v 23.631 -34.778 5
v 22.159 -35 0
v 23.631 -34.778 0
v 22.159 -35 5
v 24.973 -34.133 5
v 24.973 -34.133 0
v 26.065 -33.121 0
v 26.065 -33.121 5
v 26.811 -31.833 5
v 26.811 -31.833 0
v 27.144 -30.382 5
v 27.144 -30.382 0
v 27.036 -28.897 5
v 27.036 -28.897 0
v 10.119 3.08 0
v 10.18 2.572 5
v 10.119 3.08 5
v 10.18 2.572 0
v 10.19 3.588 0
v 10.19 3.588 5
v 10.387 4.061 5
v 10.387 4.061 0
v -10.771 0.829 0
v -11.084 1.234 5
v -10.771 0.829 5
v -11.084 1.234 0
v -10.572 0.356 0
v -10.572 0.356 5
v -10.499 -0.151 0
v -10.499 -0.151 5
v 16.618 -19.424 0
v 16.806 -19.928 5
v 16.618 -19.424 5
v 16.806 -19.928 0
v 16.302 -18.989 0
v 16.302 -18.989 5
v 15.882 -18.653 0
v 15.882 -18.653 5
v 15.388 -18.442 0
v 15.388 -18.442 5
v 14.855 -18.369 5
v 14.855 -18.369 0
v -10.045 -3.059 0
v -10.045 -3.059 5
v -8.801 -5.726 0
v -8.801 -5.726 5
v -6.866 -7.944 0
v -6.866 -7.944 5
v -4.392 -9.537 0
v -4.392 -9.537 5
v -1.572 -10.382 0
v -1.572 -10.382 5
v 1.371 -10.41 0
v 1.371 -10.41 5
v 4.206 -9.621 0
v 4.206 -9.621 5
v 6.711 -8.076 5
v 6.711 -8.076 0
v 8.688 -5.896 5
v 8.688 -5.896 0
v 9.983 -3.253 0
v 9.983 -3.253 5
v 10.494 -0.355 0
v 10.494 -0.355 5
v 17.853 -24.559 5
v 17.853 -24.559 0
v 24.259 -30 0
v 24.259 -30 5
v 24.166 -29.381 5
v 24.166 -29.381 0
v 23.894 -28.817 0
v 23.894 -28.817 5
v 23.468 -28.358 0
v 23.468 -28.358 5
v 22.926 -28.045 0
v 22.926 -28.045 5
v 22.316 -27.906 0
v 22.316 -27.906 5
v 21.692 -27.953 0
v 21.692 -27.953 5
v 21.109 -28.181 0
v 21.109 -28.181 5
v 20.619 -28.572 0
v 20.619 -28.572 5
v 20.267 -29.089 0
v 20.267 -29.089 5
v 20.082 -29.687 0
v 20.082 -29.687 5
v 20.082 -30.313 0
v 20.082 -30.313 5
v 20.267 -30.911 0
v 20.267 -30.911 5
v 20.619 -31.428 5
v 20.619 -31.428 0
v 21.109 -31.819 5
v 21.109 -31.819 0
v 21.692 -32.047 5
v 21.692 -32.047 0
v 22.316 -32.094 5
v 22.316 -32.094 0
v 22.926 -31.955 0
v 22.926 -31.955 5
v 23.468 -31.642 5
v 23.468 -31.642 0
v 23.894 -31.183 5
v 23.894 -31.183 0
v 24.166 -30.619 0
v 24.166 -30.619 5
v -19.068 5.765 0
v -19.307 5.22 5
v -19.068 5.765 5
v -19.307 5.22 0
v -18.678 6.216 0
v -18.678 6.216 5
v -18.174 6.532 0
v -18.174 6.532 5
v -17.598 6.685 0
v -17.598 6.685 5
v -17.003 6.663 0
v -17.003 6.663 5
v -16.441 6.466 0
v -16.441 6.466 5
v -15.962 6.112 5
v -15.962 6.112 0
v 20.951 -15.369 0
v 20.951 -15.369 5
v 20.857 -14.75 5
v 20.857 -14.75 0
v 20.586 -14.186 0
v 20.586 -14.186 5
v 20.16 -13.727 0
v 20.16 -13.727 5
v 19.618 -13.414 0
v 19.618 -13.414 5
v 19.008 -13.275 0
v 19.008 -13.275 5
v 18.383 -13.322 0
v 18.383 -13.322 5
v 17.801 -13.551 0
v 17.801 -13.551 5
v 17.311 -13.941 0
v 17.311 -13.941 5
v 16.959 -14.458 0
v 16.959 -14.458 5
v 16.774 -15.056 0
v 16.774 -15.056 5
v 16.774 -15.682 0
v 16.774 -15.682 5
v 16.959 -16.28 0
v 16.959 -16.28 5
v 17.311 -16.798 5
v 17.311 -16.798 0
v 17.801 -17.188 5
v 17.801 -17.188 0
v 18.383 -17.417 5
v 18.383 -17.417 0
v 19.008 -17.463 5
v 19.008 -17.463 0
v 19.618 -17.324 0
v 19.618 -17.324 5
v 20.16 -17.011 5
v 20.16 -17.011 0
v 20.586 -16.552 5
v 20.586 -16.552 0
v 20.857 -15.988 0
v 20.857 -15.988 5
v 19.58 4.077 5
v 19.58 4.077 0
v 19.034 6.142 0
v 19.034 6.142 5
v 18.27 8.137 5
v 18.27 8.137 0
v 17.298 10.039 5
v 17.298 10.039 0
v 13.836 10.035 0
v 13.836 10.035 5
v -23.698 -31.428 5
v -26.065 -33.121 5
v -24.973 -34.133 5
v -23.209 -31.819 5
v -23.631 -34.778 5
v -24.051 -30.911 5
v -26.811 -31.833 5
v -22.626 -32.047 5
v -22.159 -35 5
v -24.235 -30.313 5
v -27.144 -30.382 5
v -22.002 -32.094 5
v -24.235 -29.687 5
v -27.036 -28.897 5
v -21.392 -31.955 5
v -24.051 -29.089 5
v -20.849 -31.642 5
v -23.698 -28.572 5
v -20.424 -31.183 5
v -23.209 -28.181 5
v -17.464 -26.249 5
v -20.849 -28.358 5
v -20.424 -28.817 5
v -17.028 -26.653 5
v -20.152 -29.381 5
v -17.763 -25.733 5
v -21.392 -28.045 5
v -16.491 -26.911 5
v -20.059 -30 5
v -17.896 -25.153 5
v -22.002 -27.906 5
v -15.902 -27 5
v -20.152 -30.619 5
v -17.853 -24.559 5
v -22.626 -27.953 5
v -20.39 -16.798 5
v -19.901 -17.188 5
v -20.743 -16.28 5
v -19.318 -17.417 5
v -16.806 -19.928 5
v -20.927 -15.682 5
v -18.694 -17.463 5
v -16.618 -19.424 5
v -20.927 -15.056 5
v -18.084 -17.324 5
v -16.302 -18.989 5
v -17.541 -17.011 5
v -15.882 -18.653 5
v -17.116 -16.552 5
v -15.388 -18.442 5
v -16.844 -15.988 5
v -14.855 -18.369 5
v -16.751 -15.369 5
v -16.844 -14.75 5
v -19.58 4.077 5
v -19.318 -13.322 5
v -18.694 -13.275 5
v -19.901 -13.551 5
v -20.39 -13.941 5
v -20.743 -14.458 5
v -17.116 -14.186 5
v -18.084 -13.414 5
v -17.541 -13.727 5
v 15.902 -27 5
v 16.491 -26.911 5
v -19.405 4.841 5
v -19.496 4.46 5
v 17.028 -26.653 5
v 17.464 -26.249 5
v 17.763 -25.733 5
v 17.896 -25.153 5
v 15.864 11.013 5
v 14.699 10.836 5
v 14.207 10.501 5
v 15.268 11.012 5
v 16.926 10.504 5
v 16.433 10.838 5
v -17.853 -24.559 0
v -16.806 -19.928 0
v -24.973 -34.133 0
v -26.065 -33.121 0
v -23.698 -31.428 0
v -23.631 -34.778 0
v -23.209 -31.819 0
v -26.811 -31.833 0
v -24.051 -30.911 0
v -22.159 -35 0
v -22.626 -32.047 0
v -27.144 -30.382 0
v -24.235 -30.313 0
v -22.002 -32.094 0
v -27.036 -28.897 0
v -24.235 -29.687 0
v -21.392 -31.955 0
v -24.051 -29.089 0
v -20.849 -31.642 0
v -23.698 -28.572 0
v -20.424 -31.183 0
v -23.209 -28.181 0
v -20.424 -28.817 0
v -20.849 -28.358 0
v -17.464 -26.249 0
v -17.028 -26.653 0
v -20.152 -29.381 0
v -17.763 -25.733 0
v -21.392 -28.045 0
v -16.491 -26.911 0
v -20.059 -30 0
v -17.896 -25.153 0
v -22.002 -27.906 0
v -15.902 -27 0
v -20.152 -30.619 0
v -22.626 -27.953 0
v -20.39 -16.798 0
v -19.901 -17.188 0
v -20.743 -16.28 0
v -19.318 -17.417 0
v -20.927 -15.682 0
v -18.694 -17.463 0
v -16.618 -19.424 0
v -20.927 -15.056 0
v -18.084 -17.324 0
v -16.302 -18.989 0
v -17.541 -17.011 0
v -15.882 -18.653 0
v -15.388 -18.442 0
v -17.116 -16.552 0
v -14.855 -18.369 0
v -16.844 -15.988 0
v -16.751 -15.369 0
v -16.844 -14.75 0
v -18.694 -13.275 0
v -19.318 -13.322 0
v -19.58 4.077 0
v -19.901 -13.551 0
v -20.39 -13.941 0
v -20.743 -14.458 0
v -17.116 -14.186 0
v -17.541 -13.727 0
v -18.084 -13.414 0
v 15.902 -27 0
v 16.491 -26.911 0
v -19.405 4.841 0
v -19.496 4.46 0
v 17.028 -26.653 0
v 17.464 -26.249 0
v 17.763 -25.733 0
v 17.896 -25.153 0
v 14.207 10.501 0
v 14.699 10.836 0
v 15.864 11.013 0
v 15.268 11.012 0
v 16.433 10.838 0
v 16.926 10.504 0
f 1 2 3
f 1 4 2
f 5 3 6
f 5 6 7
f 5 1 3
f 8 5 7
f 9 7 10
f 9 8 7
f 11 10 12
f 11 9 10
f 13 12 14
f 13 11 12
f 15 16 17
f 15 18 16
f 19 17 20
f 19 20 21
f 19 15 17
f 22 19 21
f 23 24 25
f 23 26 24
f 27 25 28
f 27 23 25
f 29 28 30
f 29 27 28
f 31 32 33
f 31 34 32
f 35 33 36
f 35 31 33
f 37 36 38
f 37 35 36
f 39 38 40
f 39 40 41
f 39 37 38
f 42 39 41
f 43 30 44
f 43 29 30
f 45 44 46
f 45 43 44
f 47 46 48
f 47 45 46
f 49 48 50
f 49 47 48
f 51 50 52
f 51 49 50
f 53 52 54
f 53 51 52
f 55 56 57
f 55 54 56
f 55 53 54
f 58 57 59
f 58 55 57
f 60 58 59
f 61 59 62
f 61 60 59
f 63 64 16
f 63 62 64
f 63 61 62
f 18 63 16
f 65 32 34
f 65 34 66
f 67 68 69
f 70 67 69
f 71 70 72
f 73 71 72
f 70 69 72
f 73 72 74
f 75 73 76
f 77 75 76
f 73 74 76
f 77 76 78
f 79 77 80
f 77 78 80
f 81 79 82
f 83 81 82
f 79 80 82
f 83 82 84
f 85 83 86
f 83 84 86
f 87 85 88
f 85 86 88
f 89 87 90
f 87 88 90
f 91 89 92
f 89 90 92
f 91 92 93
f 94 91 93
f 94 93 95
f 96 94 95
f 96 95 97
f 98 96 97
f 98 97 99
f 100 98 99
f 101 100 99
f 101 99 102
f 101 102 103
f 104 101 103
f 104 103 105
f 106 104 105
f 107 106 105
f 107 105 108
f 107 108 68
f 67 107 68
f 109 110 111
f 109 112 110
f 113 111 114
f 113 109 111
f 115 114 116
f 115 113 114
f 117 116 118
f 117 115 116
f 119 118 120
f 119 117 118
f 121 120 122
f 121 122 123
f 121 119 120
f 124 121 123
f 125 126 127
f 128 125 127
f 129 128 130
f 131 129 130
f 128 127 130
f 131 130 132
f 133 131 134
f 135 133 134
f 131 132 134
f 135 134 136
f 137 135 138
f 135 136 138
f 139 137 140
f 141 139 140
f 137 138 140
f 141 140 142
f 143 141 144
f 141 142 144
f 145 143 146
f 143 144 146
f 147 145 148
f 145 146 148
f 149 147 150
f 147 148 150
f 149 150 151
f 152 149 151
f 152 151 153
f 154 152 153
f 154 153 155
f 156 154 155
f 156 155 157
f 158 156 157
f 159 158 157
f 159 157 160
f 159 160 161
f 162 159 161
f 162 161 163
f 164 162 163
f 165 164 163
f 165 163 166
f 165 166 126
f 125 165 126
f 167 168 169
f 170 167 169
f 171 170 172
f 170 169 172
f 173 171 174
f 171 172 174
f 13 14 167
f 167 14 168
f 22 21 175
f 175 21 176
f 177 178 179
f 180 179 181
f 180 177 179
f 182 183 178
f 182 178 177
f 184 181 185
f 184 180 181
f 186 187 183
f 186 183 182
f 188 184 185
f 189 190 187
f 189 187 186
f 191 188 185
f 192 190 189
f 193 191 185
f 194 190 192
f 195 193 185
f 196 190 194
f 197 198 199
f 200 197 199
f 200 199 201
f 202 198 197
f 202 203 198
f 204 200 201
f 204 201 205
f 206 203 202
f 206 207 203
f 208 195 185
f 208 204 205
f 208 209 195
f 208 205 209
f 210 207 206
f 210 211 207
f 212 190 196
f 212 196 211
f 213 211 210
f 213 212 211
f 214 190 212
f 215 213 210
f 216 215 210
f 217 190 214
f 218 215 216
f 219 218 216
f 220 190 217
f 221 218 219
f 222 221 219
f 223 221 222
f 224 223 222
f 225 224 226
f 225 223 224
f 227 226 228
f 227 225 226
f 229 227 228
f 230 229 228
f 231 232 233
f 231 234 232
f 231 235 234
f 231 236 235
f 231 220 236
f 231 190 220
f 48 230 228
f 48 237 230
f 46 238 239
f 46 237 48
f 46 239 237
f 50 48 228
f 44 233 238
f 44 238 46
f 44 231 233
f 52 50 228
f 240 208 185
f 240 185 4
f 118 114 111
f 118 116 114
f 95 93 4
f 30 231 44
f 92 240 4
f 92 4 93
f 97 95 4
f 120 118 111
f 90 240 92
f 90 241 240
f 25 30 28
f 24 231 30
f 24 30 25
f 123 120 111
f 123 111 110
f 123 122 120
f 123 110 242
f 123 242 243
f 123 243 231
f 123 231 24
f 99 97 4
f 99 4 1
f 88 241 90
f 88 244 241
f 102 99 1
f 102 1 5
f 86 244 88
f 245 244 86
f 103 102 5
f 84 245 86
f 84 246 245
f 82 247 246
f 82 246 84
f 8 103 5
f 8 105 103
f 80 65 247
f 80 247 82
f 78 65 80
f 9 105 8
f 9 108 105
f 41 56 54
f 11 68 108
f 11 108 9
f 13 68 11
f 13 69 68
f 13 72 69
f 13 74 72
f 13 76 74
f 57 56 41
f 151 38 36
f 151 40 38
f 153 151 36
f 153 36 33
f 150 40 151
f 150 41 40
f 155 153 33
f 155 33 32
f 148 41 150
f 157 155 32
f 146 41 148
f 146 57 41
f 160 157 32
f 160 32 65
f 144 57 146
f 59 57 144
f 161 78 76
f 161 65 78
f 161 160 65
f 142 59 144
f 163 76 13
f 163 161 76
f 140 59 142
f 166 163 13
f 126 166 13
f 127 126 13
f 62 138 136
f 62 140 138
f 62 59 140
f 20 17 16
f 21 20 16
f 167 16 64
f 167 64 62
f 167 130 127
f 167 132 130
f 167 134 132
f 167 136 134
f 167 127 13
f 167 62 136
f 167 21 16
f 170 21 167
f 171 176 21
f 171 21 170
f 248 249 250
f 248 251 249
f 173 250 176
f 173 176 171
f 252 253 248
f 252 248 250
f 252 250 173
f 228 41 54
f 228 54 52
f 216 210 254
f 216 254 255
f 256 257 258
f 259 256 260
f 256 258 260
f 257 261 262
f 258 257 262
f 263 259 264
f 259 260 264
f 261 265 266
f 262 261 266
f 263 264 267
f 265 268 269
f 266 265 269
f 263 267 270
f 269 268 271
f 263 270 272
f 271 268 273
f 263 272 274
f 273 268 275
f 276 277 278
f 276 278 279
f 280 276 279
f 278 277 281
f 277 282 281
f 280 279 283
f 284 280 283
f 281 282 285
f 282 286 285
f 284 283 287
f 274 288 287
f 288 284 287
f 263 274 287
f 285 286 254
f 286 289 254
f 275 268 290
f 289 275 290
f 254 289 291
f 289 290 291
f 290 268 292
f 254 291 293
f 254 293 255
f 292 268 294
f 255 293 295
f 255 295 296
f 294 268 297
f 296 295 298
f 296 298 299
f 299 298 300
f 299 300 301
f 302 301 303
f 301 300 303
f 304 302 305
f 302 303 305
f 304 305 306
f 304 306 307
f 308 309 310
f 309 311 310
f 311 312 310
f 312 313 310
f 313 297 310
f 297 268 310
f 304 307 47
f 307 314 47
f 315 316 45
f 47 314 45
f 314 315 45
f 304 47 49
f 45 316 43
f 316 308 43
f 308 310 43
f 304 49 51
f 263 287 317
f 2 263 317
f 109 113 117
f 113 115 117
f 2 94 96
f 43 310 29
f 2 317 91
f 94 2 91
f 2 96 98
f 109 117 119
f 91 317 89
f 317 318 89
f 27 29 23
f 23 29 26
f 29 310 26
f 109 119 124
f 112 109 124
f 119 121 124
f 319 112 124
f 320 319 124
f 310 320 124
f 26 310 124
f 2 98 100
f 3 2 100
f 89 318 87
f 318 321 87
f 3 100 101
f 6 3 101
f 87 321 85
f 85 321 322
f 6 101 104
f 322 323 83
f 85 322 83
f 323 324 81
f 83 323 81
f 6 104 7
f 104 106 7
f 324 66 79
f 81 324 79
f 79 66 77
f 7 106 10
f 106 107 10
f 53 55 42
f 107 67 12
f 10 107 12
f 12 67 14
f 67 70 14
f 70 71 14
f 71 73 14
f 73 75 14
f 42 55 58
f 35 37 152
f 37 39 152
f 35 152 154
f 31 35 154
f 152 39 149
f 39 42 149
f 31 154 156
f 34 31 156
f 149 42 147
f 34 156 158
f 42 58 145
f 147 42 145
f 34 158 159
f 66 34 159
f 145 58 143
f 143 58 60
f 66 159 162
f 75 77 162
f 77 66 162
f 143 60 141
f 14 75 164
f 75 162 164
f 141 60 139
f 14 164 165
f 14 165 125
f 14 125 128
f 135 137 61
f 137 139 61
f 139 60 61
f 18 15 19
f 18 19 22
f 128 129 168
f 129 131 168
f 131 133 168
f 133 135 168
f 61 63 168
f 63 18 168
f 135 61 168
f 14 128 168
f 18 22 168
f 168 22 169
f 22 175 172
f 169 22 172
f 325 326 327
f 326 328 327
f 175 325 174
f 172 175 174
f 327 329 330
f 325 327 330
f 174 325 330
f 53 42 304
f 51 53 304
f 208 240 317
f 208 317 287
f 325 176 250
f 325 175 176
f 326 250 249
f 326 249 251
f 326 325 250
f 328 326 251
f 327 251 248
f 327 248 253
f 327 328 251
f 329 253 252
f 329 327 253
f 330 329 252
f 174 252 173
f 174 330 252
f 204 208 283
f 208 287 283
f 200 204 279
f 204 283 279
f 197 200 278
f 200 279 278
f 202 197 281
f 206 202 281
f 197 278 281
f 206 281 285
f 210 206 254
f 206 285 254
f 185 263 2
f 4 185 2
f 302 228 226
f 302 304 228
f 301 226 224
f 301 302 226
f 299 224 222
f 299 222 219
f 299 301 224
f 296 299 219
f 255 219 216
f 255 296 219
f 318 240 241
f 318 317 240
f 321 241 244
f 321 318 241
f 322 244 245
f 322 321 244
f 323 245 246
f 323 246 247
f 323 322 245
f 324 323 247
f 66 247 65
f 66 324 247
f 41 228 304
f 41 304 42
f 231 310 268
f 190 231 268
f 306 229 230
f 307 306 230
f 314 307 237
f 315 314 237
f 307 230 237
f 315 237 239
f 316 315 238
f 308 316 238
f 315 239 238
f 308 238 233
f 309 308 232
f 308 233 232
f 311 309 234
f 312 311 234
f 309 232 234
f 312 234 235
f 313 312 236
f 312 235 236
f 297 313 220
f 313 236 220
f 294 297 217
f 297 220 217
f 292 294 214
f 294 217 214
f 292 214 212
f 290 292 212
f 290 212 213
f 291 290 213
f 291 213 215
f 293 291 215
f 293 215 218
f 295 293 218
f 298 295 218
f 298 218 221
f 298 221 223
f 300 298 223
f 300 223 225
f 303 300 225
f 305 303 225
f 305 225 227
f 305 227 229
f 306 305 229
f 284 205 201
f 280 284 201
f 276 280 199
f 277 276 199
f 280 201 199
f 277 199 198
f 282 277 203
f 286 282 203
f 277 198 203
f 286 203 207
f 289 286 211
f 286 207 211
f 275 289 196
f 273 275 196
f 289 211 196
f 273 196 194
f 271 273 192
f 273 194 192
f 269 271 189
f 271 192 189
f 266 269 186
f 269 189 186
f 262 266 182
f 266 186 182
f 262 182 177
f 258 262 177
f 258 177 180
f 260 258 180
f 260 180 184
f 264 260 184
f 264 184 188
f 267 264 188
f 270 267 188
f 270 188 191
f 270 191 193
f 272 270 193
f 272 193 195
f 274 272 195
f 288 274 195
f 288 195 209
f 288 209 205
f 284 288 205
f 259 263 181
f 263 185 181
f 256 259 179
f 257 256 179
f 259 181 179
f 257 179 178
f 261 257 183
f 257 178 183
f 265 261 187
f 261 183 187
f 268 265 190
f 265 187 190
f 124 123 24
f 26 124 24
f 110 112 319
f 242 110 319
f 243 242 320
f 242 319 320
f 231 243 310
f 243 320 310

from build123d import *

# Parameters (mm, degrees)
SKETCH_1_R          = 20
SKETCH_1_R_2        = 10.5
EXTRUDE_1_DEPTH     = 5
EXTRUDE_START       = -5
EXTRUDE_2_DEPTH     = 5
FILLET_1_R          = 5
SKETCH_3_R          = 2.1
CUT_EXTRUDE_1_DEPTH = 45.582524906
CUT_EXTRUDE_2_DEPTH = 45.582524906
FILLET_2_R          = 2


with BuildPart() as part:
    # 草图1 → 凸台-拉伸1 (new body)
    with BuildSketch(Plane.XY):
        Circle(SKETCH_1_R)
        Circle(SKETCH_1_R_2, mode=Mode.SUBTRACT)
    extrude(amount=EXTRUDE_1_DEPTH)

    # 草图2 → 凸台-拉伸2 (add)
    with BuildSketch(Plane.XY.offset(5).offset(EXTRUDE_START)):
        with BuildLine():
            Line((-28.415563483, -35), (28.415563483, -35))
            Line((28.415563483, -35), (19.580039782, 4.077013874))
            ThreePointArc((19.580039782, 4.077013874), (19.894732917, 2.049293093), (20, 0))
            ThreePointArc((20, 0), (-2.049293093, -19.894732917), (-19.580039782, 4.077013874))
            Line((-19.580039782, 4.077013874), (-28.415563483, -35))
        make_face()
    extrude(amount=EXTRUDE_2_DEPTH)

    # 圆角1
    fillet_1_edges = [part.edges().sort_by_distance(p)[0] for p in [
        (28.415563483, -35, 2.5),
        (-28.415563483, -35, 2.5),
    ]]
    fillet(fillet_1_edges, radius=FILLET_1_R)

    # 草图3 → 切除-拉伸1 (cut, through all)
    with BuildSketch(Plane.XY.offset(5)):
        with Locations((22.158820427, -30)):
            Circle(SKETCH_3_R)
        with Locations((-22.158820427, -30)):
            Circle(SKETCH_3_R)
        with Locations((-18.850745921, -15.36932527)):
            Circle(SKETCH_3_R)
        with Locations((18.850745921, -15.36932527)):
            Circle(SKETCH_3_R)
        Polygon((-16.453332464, -18.36932527), (16.453332464, -18.36932527), (18.404774593, -27), (-18.404774593, -27), align=None)
    extrude(amount=-CUT_EXTRUDE_1_DEPTH, mode=Mode.SUBTRACT)

    # 草图4 → 切除-拉伸2 (cut, through all)
    with BuildSketch(Plane.XY.offset(5)):
        with BuildLine():
            Line((-2.103165657, 10.287210225), (-1.493384576, 11.343382038))
            Line((-1.493384576, 11.343382038), (-8.331863171, 18.181860633))
            ThreePointArc((-8.331863171, 18.181860633), (-14.142135624, 14.142135624), (-18.181860633, 8.331863171))
            Line((-18.181860633, 8.331863171), (-10.481021364, 0.631023902))
            ThreePointArc((-10.481021364, 0.631023902), (-7.931010296, 6.881066464), (-2.103165657, 10.287210225))
        make_face()
        with BuildLine():
            Line((-8.331863171, 18.181860633), (-1.493384576, 11.343382038))
            Line((-1.493384576, 11.343382038), (3.342150011, 19.718773626))
            ThreePointArc((3.342150011, 19.718773626), (-2.610523844, 19.828897227), (-8.331863171, 18.181860633))
        make_face()
        with BuildLine():
            ThreePointArc((-2.103165657, 10.287210225), (-1.370525018, 10.410171044), (-0.631023902, 10.481021364))
            Line((-0.631023902, 10.481021364), (-1.493384576, 11.343382038))
            Line((-1.493384576, 11.343382038), (-2.103165657, 10.287210225))
        make_face()
        with BuildLine():
            Line((-1.493384576, 11.343382038), (-0.631023902, 10.481021364))
            ThreePointArc((-0.631023902, 10.481021364), (5.879816622, 8.699296321), (9.960568218, 3.322210225))
            Line((9.960568218, 3.322210225), (15.405883886, 12.753773626))
            ThreePointArc((15.405883886, 12.753773626), (10, 17.320508076), (3.342150011, 19.718773626))
            Line((3.342150011, 19.718773626), (-1.493384576, 11.343382038))
        make_face()
    extrude(amount=-CUT_EXTRUDE_2_DEPTH, mode=Mode.SUBTRACT)

    # 圆角2
    fillet_2_edges = [part.edges().sort_by_distance(p)[0] for p in [
        (-19.580039782, 4.077013874, 2.5),
        (19.580039782, 4.077013874, 2.5),
        (-18.404774593, -27, 2.5),
        (-16.453332464, -18.36932527, 2.5),
        (16.453332464, -18.36932527, 2.5),
        (18.404774593, -27, 2.5),
        (9.960568218, 3.322210225, 2.5),
        (-10.481021364, 0.631023902, 2.5),
        (-18.181860633, 8.331863171, 2.5),
        (15.405883886, 12.753773626, 2.5),
    ]]
    fillet(fillet_2_edges, radius=FILLET_2_R)


solid = part.part
